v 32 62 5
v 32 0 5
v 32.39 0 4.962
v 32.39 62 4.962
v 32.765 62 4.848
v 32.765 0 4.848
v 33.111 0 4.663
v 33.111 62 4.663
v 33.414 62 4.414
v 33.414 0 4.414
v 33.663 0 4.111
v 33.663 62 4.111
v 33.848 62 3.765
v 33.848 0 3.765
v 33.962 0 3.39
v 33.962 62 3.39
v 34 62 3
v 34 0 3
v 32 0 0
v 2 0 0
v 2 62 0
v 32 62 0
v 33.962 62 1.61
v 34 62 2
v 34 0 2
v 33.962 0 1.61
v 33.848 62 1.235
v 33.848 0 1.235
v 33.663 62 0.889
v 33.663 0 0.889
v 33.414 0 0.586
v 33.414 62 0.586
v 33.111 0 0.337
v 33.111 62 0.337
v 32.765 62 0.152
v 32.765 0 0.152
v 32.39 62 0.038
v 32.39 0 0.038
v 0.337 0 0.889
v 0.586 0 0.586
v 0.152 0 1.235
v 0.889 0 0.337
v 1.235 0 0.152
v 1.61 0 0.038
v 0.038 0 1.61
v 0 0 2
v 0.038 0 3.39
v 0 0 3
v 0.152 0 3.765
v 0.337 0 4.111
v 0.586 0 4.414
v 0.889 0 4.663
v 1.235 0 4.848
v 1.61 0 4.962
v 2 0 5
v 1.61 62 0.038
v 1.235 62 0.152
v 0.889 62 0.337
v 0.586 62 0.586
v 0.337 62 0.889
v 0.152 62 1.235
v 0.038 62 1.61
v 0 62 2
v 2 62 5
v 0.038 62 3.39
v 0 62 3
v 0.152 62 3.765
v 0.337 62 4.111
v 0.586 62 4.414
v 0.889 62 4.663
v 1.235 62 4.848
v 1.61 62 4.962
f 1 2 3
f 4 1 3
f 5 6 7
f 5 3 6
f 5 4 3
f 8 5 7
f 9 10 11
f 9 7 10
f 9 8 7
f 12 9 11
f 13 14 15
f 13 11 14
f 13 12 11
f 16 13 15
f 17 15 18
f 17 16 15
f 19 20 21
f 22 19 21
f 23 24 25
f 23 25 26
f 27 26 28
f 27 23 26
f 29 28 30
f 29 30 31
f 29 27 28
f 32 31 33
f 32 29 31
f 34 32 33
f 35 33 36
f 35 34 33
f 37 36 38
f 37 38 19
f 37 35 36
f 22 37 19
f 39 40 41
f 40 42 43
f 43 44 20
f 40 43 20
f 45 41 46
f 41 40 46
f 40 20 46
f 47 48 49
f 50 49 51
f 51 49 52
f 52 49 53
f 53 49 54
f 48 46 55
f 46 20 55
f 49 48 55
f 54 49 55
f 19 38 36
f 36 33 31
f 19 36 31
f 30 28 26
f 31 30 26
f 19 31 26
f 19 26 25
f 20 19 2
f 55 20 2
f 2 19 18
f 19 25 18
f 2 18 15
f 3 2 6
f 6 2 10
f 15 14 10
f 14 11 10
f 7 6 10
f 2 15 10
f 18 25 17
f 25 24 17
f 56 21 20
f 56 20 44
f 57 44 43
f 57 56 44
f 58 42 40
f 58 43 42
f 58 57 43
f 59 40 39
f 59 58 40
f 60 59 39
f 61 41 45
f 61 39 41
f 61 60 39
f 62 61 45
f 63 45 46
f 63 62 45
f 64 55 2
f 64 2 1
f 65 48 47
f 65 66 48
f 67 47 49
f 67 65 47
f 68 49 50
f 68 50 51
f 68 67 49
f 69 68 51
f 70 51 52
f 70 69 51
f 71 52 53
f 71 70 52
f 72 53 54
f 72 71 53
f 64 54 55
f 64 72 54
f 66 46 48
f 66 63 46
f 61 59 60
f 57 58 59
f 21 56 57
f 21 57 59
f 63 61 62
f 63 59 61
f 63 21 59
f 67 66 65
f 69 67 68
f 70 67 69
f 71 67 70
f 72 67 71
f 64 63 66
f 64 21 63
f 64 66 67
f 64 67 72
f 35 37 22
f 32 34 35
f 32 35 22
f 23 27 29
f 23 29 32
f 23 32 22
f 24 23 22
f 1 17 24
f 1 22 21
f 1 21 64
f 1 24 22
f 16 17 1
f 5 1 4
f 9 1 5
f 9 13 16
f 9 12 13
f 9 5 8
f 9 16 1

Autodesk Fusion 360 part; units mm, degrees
sketch "Sketch1" plane through (0, 0, 0) normal (0, 0, 1) x (1, 0, 0)
box "BoxPrimitive1" add length 62 width 34 height 5 placed x (0, 1, 0) y (-1, 0, 0) z (0, 0, 1) at (34, 0, 0)
fillet "Fillet1" radius 2 4 edges at (34, 31, 5) (34, 31, 0) (0, 31, 5) (0, 31, 0)
